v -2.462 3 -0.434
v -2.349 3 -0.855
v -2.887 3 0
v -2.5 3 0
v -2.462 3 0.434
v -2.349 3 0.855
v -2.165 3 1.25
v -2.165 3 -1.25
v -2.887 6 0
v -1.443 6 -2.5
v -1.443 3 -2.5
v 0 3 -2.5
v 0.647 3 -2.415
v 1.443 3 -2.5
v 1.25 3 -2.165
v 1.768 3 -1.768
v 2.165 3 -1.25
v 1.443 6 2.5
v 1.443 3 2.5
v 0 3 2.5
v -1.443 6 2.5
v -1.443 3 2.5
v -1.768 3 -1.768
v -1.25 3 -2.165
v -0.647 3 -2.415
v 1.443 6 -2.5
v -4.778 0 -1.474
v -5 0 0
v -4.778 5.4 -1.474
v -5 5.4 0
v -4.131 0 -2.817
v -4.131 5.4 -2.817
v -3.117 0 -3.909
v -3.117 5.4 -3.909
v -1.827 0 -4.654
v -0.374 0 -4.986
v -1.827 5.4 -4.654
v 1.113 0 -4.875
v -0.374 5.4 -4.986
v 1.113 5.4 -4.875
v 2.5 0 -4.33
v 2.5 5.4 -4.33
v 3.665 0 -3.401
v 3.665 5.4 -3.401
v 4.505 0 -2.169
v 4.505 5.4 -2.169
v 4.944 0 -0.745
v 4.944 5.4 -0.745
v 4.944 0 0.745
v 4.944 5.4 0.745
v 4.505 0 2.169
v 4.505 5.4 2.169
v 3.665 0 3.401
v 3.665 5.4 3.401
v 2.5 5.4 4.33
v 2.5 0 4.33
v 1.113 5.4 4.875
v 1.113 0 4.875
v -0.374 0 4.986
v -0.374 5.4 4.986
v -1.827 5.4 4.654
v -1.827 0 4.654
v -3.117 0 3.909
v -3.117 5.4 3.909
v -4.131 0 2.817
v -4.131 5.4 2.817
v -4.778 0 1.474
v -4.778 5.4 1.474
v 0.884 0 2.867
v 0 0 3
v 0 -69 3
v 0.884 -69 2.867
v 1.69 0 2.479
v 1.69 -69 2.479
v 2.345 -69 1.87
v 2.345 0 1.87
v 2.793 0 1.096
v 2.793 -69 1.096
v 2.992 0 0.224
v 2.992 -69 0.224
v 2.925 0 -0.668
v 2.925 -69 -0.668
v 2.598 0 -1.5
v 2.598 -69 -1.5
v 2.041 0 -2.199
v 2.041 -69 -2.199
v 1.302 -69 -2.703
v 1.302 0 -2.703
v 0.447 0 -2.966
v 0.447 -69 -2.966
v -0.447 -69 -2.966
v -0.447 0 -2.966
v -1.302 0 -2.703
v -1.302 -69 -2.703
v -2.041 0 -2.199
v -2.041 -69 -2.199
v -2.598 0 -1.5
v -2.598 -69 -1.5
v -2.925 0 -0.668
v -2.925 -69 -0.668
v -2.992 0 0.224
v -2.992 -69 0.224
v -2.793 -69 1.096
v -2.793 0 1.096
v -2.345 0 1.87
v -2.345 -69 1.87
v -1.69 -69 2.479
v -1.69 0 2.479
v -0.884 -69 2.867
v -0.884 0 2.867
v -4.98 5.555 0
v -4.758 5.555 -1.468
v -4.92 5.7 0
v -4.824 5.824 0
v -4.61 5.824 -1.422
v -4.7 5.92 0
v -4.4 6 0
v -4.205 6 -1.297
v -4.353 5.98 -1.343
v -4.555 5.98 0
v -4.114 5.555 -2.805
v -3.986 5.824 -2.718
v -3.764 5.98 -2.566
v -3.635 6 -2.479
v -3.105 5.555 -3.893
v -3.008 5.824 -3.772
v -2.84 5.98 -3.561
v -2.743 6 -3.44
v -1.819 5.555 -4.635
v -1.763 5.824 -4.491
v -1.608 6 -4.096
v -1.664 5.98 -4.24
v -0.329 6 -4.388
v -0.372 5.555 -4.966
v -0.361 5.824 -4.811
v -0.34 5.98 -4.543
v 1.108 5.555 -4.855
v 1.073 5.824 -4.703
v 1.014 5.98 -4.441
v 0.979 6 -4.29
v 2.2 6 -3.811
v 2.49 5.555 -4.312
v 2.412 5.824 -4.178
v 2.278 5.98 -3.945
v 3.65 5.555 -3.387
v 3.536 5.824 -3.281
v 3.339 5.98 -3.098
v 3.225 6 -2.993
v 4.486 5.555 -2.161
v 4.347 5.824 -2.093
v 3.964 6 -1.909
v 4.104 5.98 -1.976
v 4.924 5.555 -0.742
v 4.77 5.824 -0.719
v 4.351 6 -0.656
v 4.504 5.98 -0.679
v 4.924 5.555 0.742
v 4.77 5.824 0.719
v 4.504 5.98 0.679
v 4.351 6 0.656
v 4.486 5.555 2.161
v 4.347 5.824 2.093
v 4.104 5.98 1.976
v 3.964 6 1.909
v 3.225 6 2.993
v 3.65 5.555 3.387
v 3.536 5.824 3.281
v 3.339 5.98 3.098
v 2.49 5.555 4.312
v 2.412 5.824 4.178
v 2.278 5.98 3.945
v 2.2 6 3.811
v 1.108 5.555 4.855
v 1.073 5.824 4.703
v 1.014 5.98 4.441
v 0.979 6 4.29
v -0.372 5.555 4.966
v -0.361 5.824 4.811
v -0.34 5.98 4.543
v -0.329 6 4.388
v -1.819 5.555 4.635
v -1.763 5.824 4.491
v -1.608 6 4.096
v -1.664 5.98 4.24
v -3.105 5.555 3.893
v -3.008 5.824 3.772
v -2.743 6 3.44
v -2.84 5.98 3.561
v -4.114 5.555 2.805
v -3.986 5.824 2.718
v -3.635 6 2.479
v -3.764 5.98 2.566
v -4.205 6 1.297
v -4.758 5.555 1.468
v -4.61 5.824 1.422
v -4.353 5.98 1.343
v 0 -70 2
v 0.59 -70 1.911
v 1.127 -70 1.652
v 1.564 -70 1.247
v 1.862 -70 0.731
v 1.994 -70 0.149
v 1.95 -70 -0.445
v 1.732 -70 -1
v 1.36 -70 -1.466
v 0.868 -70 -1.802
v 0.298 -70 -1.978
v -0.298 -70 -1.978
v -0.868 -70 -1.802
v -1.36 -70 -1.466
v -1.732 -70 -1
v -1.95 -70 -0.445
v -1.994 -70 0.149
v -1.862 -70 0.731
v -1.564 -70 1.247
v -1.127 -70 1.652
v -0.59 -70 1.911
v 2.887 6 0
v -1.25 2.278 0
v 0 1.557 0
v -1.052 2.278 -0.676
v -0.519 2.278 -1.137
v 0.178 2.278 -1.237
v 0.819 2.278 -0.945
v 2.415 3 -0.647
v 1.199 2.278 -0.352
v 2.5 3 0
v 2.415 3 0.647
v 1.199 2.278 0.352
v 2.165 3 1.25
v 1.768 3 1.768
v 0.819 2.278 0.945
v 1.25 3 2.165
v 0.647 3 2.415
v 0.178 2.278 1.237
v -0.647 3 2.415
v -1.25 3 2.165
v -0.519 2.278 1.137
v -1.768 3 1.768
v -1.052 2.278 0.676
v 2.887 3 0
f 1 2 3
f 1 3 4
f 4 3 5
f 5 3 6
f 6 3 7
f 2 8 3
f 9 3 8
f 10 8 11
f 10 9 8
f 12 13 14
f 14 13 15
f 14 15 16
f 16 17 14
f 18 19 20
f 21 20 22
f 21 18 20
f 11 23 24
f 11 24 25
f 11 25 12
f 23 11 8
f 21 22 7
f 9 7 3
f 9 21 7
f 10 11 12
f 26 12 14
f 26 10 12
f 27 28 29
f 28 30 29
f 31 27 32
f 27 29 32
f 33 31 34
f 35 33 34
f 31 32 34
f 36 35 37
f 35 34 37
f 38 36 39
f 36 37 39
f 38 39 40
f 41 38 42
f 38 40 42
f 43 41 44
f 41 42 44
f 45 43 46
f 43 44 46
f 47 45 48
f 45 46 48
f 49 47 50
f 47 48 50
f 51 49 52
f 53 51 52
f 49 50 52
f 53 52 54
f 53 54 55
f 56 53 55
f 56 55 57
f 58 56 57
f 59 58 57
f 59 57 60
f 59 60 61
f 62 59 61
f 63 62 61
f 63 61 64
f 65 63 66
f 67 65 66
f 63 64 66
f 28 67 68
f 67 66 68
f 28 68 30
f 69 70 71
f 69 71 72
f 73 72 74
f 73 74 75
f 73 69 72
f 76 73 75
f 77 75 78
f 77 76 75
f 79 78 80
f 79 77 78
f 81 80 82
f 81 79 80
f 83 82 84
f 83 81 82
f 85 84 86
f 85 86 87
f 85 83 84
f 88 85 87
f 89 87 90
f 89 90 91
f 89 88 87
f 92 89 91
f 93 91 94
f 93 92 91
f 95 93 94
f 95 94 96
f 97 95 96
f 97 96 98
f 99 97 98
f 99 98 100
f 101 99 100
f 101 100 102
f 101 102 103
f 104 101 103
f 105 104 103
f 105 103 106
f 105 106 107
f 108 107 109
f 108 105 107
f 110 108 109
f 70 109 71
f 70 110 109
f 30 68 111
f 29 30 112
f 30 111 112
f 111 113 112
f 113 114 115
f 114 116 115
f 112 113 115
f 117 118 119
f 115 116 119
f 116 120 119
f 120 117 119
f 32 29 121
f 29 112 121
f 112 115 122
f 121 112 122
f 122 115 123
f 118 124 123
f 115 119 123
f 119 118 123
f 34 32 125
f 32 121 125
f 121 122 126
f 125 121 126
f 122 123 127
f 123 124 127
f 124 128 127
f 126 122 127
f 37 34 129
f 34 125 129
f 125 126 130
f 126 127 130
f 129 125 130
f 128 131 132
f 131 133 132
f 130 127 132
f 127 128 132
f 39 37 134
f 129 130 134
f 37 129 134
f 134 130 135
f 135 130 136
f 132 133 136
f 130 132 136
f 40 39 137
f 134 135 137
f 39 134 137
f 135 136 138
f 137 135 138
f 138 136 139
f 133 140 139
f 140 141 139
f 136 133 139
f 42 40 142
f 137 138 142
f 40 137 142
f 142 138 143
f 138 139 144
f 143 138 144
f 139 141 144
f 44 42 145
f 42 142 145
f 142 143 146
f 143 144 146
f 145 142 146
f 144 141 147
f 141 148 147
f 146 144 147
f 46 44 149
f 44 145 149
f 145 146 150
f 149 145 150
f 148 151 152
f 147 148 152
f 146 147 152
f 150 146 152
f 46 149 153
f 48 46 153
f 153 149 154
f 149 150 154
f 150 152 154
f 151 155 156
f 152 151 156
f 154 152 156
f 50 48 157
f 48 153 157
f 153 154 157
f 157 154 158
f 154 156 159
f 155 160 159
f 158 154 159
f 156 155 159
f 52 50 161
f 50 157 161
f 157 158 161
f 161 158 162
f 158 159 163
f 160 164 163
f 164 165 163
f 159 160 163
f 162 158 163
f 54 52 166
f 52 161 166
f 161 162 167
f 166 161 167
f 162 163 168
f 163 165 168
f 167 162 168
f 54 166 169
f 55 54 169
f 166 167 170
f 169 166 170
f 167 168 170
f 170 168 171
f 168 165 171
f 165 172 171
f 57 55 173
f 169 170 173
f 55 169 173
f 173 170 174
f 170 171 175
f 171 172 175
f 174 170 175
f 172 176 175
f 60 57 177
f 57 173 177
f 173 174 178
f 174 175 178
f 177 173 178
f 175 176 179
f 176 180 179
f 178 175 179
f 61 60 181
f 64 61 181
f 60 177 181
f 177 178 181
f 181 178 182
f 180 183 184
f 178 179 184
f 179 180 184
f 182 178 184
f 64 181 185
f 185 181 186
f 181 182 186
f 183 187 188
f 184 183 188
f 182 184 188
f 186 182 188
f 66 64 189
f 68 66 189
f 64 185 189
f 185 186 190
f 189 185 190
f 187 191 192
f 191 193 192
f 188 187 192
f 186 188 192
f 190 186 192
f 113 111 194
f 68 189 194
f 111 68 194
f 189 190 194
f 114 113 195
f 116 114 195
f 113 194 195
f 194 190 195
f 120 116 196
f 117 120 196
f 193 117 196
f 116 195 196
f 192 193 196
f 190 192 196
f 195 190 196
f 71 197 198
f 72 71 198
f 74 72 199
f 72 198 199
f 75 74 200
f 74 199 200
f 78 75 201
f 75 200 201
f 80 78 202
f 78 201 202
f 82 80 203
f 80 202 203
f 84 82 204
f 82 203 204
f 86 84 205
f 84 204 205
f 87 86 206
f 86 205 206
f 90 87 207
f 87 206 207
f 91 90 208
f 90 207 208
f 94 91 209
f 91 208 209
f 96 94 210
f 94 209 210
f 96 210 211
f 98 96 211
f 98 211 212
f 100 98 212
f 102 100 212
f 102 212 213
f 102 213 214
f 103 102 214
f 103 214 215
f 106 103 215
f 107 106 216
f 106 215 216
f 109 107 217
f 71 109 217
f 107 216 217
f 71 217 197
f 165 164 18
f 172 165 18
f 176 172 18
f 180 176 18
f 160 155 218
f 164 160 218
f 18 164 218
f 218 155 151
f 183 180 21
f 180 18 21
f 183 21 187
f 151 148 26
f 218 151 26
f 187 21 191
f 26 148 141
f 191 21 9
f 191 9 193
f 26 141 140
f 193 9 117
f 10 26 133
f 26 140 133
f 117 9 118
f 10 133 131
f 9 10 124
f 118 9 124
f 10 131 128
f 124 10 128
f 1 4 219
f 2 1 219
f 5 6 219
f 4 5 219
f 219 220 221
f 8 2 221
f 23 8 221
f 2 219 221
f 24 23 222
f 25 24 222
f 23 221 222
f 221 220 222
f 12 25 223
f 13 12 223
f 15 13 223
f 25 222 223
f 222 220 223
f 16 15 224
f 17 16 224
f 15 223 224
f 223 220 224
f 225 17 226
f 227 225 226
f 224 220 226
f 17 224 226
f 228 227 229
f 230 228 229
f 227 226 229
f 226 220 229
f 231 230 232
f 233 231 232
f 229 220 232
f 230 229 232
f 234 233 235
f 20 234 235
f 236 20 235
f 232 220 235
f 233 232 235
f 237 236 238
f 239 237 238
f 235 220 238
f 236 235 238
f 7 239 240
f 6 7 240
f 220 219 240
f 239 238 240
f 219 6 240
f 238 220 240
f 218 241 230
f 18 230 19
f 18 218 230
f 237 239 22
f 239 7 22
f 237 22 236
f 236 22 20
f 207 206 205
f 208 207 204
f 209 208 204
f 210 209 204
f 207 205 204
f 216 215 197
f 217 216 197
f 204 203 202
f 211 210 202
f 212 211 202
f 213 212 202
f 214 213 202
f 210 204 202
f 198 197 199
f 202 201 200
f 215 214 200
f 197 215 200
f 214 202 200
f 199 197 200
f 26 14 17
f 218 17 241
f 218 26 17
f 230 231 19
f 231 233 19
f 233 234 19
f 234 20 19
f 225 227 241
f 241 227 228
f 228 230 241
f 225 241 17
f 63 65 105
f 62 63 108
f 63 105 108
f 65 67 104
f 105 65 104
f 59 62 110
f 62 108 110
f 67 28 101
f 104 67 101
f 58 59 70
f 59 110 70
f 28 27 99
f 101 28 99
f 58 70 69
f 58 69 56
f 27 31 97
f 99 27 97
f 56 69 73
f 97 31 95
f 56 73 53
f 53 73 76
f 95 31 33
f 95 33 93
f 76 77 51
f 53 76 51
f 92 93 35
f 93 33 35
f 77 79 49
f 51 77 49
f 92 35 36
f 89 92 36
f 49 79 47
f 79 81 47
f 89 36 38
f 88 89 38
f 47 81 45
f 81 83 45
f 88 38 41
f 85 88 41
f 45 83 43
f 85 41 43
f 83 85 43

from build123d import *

# Parameters (mm, degrees)
ESQUISSE1_R             = 3
TIGE_DEPTH              = 70
CHANFREIN_D_ENTR_E_SIZE = 1
HEXAGONE_DEPTH          = 3


with BuildPart() as part:
    # Esquisse1 → Tige (new body)
    with BuildSketch(Plane(origin=(0, 0, 0), x_dir=(1, 0, 0), z_dir=(0, 1, 0))):
        Circle(ESQUISSE1_R)
    extrude(amount=-TIGE_DEPTH)

    # Chanfrein d'entrée
    chanfrein_d_entr_e_edges = [part.edges().sort_by_distance(p)[0] for p in [
        (-3, -70, 0),
    ]]
    chamfer(chanfrein_d_entr_e_edges, length=CHANFREIN_D_ENTR_E_SIZE)

    # Esquisse2 → Tête (revolve)
    with BuildSketch(Plane.XY):
        with BuildLine():
            Line((2.5, 6), (2.5, 3))
            Line((2.5, 3), (0, 1.556624327))
            Line((0, 1.556624327), (0, 0))
            Line((0, 0), (5, 0))
            Line((5, 0), (5, 5.4))
            ThreePointArc((5, 5.4), (4.824264069, 5.824264069), (4.4, 6))
            Line((4.4, 6), (2.5, 6))
        make_face()
    revolve(axis=Axis((0, 6, 0), (0, -1, 0)))

    # Esquisse3 → Hexagone (cut)
    with BuildSketch(Plane(origin=(0, 6, -3), x_dir=(1, 0, 0), z_dir=(0, -1, 0))):
        Polygon((1.443375673, 5.5), (-1.443375673, 5.5), (-2.886751346, 3), (-1.443375673, 0.5), (1.443375673, 0.5), (2.886751346, 3), align=None)
    extrude(amount=HEXAGONE_DEPTH, mode=Mode.SUBTRACT)


solid = part.part
